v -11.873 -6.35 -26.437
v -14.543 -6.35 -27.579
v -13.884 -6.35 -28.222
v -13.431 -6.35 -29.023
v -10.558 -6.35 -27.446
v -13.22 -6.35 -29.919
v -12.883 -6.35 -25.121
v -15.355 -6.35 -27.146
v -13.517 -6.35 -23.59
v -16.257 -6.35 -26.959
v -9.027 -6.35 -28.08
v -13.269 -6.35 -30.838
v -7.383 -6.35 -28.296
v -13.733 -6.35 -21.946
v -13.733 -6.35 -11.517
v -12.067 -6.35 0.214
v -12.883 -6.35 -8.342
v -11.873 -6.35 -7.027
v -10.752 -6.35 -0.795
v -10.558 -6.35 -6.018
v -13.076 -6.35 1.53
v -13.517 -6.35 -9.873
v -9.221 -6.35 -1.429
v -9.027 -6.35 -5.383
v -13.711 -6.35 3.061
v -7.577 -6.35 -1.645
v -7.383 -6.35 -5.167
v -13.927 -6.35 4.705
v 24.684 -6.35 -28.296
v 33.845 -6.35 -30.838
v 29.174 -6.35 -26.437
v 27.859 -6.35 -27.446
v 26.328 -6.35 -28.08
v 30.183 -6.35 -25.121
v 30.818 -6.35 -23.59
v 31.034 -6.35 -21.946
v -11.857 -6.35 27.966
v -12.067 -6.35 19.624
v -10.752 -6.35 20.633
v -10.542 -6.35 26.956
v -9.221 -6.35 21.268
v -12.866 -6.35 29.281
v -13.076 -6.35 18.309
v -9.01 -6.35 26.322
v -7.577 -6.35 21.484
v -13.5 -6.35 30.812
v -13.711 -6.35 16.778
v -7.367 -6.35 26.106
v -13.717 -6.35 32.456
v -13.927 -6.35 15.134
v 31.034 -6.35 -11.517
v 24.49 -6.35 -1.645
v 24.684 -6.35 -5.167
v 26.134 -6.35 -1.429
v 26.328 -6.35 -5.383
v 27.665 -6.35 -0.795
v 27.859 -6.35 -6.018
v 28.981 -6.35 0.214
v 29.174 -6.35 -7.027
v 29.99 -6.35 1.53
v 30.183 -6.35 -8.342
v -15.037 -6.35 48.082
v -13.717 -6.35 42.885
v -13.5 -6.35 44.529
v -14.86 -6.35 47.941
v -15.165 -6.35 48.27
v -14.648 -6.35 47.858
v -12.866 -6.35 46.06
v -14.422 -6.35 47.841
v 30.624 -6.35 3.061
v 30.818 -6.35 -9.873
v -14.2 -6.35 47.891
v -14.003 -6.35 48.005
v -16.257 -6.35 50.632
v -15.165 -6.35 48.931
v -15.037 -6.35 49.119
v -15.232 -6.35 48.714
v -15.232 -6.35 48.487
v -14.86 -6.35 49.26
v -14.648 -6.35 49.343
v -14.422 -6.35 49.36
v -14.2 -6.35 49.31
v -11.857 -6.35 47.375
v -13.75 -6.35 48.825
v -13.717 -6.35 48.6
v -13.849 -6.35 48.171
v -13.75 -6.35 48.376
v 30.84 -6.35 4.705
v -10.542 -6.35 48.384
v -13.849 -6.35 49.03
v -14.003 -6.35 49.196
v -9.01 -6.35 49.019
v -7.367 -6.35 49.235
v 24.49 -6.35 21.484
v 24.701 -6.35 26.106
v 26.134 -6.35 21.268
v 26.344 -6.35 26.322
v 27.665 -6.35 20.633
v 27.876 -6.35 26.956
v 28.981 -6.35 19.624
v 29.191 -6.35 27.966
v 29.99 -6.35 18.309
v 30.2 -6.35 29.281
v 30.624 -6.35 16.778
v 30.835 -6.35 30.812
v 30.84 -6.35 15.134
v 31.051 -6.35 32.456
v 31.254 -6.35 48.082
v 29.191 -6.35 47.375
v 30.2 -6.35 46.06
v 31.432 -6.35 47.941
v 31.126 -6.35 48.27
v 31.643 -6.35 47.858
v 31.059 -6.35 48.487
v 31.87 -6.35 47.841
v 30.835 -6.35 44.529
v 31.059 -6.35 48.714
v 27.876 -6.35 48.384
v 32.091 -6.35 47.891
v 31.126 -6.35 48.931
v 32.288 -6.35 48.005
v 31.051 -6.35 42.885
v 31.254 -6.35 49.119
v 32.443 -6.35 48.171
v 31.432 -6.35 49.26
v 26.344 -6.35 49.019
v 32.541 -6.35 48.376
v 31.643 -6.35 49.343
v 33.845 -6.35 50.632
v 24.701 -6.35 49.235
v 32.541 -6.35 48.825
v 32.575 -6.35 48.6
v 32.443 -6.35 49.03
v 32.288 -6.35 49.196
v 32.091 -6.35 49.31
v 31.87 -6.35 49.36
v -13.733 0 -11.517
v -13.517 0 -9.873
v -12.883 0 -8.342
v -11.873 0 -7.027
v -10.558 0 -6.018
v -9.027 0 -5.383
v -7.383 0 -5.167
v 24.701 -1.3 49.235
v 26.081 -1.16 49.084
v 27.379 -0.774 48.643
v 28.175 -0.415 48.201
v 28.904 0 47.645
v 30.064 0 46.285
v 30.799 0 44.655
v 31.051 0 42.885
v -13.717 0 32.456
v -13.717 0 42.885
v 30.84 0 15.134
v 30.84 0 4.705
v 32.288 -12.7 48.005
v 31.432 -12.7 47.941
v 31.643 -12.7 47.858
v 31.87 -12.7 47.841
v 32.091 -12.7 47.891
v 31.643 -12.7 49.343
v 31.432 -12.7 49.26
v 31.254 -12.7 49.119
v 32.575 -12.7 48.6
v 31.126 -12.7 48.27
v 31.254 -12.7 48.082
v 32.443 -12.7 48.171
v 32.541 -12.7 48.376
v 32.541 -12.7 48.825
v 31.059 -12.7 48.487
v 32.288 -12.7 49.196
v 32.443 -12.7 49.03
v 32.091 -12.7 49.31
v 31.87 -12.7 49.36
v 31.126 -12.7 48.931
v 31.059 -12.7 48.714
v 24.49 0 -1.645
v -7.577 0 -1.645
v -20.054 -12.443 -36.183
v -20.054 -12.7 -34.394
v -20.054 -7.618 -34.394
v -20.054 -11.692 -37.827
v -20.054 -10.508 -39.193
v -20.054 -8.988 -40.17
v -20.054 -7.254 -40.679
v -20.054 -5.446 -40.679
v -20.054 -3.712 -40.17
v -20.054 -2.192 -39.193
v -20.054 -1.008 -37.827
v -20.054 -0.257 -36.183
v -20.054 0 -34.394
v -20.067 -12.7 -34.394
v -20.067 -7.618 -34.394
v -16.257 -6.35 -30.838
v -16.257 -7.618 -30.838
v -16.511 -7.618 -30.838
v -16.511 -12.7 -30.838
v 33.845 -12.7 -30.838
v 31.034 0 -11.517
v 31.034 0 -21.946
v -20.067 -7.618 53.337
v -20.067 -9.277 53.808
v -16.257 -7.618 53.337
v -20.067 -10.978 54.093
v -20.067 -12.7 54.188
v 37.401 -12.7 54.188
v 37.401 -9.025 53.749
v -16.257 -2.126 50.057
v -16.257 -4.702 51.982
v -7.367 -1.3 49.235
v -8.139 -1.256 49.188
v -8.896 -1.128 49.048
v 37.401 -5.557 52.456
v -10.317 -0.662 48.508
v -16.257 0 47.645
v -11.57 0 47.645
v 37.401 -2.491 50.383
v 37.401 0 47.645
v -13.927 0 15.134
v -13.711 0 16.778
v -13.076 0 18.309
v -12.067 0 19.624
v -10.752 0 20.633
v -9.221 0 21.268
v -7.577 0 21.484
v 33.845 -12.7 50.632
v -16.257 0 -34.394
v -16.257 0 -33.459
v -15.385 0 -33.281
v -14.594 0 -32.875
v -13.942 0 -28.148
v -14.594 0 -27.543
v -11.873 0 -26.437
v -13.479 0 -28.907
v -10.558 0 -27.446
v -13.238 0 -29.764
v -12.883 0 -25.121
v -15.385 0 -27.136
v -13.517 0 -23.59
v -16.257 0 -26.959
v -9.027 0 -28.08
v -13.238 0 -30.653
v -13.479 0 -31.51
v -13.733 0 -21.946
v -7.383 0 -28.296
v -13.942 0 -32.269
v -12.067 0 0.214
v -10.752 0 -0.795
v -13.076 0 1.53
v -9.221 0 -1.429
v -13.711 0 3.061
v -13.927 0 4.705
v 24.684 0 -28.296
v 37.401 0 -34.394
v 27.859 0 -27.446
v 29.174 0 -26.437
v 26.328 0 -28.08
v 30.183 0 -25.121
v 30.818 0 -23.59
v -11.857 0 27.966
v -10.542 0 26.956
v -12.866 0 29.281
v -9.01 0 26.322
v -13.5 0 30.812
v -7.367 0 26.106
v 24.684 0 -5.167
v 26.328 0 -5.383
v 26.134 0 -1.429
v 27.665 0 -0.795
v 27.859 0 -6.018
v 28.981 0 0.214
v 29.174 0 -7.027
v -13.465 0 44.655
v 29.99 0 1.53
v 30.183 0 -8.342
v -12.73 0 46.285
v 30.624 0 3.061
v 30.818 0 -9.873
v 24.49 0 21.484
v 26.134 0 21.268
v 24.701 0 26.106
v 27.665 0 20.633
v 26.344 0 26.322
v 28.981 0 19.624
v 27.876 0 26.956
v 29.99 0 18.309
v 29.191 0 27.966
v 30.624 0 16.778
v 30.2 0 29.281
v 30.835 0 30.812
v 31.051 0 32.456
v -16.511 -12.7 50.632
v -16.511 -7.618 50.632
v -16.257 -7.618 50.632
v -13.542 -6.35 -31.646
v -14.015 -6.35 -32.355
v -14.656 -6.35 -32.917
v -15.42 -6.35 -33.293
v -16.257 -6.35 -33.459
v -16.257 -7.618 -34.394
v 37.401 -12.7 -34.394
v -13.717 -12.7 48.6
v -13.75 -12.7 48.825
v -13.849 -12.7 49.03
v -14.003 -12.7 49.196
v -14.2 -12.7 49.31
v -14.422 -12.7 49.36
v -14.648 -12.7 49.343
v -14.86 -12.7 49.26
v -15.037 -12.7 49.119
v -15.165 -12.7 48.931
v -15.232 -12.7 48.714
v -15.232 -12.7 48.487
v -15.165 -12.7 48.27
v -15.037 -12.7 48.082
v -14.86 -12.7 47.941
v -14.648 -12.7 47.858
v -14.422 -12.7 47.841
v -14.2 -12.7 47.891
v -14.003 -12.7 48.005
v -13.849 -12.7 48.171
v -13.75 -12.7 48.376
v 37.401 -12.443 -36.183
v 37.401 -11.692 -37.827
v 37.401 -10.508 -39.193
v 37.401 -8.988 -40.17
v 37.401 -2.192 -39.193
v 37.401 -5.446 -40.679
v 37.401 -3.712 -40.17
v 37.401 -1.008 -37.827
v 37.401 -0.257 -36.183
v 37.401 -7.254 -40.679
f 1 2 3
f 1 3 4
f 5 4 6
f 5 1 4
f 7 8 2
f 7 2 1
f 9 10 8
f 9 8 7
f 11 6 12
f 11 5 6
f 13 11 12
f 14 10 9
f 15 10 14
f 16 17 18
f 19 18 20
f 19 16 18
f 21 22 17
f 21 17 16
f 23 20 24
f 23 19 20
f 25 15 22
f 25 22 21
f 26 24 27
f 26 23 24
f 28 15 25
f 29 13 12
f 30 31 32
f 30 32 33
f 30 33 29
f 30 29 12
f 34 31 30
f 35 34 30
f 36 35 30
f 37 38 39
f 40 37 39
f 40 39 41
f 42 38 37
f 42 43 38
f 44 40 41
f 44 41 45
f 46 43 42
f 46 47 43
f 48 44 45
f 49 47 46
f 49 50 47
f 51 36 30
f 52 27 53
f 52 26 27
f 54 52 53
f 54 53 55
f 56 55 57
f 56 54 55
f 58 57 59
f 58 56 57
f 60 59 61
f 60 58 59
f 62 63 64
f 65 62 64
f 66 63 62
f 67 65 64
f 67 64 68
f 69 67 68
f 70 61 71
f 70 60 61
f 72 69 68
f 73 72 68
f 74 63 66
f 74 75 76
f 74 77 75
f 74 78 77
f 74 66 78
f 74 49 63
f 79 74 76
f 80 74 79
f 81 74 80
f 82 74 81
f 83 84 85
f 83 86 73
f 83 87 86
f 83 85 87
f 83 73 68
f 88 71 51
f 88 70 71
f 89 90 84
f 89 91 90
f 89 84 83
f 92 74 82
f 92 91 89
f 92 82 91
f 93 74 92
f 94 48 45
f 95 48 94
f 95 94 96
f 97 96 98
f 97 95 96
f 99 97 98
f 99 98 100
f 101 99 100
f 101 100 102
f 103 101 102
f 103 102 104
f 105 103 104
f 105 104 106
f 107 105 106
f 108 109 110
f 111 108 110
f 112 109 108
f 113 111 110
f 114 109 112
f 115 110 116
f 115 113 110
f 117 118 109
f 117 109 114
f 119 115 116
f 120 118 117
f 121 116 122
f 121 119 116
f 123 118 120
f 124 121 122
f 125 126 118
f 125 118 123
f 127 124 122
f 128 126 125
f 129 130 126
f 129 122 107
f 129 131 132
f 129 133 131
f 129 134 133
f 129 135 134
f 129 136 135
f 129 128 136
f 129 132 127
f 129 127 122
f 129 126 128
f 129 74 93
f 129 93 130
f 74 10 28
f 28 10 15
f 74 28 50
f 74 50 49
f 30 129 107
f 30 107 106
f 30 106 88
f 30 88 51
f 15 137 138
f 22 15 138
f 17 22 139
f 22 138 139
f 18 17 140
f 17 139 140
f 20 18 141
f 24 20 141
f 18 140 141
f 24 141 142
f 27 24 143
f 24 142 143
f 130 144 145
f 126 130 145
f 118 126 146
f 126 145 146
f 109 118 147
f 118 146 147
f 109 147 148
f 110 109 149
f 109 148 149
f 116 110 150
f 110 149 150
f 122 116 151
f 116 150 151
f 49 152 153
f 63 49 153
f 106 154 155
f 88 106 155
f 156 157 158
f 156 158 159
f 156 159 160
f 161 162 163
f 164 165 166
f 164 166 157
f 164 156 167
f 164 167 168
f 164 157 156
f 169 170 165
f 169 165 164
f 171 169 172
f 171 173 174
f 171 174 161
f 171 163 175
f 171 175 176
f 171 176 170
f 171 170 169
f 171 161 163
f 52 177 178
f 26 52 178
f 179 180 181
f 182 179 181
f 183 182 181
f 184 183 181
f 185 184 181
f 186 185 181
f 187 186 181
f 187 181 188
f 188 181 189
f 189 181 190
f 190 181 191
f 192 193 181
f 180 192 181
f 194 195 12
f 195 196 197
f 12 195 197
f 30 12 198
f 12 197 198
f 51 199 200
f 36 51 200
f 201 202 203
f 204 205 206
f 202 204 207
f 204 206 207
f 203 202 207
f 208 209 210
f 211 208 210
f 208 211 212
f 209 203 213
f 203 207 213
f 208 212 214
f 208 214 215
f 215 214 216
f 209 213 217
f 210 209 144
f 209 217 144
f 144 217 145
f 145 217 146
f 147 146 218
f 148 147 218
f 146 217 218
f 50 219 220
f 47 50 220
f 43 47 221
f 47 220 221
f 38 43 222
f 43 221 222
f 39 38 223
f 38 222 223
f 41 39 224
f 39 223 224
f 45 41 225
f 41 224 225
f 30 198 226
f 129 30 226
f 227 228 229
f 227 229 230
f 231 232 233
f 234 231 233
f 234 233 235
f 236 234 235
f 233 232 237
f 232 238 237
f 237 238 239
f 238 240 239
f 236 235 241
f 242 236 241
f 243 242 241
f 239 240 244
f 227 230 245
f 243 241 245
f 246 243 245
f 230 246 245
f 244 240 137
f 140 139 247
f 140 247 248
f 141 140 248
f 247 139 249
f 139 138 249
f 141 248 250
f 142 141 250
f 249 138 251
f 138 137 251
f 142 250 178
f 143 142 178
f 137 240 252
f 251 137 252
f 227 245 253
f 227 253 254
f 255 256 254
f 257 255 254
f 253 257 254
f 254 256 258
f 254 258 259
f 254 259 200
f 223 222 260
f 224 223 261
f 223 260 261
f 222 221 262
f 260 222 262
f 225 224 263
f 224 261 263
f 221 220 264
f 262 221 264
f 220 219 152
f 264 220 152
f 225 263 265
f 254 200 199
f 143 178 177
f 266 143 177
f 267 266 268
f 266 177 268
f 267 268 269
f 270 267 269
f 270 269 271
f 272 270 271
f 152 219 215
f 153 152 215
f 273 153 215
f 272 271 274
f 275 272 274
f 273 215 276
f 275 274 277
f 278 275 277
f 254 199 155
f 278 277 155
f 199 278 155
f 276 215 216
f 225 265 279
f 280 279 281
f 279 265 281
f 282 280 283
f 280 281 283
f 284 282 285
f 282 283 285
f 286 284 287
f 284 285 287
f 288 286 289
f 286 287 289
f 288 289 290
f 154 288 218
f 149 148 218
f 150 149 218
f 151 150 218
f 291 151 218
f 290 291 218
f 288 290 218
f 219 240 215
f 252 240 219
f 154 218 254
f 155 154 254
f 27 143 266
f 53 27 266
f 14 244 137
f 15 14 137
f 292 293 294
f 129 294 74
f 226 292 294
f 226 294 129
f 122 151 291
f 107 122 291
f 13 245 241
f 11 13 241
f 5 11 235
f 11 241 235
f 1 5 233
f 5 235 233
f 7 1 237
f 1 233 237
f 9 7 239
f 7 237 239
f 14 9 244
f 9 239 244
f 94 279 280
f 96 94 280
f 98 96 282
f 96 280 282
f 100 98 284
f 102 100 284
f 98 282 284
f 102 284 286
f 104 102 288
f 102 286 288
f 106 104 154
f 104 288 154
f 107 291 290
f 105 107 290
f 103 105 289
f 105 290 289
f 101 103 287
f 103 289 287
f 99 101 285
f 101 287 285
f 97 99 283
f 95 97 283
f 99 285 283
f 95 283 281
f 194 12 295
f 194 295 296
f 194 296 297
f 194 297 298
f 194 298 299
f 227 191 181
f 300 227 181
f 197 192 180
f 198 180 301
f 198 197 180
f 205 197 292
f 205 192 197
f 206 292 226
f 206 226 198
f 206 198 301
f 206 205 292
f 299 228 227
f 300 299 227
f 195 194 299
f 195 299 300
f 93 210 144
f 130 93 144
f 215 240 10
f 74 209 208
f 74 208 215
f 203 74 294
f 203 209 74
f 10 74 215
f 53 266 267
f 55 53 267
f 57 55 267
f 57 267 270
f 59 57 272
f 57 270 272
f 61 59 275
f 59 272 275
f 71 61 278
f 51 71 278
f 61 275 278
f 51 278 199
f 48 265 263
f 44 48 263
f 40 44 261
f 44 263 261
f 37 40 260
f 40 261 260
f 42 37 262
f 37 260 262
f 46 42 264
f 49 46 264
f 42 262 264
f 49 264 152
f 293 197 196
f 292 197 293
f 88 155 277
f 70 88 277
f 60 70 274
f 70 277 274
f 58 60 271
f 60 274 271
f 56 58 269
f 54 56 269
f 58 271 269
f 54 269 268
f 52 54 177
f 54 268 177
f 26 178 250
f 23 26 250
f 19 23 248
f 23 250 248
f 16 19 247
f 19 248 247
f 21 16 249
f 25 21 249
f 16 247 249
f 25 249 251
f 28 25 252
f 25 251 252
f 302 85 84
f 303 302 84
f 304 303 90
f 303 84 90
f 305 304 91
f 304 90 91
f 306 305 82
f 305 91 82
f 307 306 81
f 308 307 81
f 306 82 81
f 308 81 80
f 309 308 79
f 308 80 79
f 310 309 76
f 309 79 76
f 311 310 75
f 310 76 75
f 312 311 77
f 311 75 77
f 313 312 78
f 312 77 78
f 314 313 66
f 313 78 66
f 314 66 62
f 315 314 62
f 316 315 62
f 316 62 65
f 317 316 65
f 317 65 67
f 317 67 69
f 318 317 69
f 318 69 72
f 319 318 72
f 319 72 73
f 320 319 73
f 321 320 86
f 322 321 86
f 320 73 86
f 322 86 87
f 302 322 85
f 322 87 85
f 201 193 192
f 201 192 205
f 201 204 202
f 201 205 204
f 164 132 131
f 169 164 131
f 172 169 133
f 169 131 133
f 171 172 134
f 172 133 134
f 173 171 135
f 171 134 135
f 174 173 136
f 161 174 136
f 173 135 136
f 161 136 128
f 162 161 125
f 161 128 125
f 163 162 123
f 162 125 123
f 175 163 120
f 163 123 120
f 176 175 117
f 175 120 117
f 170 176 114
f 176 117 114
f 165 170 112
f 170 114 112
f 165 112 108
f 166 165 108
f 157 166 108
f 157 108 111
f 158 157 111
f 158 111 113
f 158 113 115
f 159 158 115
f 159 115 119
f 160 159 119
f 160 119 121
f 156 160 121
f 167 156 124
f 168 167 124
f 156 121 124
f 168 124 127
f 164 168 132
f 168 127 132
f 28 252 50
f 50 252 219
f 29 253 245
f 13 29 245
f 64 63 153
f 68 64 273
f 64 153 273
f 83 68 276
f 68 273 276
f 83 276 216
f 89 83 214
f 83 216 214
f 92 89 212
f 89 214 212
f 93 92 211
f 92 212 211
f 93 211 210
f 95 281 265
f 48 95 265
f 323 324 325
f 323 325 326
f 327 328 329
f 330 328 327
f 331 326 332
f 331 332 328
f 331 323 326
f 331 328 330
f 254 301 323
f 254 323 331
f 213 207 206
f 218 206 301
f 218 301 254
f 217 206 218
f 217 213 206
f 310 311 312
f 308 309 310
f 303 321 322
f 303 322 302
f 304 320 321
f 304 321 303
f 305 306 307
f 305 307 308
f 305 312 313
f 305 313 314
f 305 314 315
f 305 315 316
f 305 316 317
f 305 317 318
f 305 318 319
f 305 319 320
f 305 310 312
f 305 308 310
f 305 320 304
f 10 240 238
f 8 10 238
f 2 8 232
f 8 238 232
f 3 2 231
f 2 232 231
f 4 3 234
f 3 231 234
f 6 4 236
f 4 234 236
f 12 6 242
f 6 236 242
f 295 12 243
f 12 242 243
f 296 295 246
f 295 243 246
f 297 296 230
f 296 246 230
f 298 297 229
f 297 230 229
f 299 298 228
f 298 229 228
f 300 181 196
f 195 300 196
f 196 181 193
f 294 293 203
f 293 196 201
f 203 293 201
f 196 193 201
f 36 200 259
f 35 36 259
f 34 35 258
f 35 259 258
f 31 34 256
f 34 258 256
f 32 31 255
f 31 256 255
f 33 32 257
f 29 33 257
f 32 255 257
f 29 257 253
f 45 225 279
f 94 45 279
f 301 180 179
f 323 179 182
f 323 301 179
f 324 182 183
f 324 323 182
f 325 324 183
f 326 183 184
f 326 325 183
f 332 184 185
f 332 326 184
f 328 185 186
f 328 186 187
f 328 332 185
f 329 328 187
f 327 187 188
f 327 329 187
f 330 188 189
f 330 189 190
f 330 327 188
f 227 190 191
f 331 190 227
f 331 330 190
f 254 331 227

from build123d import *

# Parameters (mm, degrees)
F0_W      = 57.4675095904
F0_H      = 88.5825127872
F1_DEPTH  = 12.7
F3_DEPTH  = 57.4685095904
F4_W      = 50.3555086569
F4_H      = 81.4705118537
F5_DEPTH  = 6.35
F6_R      = 0.7619995332
F8_DEPTH  = 6.35
F11_DEPTH = 56.388
F12_DEPTH = 1.0668
F15_DEPTH = 6.35
F16_DEPTH = 3.81


# Not quite as in the source:
# - a feature of the source that left no trace in its solid (it failed there, or was rolled back) is left out


with BuildPart() as f1:
    # F0 (on Front) → F1 (new body)
    with BuildSketch(Plane.XZ):
        with Locations((8.6671997911, 9.8971910775)):
            Rectangle(F0_W, F0_H)
        with BuildLine():
            ThreePointArc((-13.7333380541, -11.5169252571), (-11.8734661146, -7.0267971965), (-7.3833380541, -5.1669252571))
            Line((-7.3833380541, -5.1669252571), (24.6841715364, -5.1669252571))
            ThreePointArc((24.6841715364, -5.1669252571), (29.1742995969, -7.0267971965), (31.0341715364, -11.5169252571))
            Line((31.0341715364, -11.5169252571), (31.0341715364, -21.9464536455))
            ThreePointArc((31.0341715364, -21.9464536455), (29.1742995969, -26.436581706), (24.6841715364, -28.2964536455))
            Line((24.6841715364, -28.2964536455), (-7.3833380541, -28.2964536455))
            ThreePointArc((-7.3833380541, -28.2964536455), (-11.8734661146, -26.436581706), (-13.7333380541, -21.9464536455))
            Line((-13.7333380541, -21.9464536455), (-13.7333380541, -11.5169252571))
        make_face(mode=Mode.SUBTRACT)
        with BuildLine():
            ThreePointArc((-13.9270129099, 15.1340997942), (-12.0671409704, 19.6242278547), (-7.5770129099, 21.4840997942))
            Line((-7.5770129099, 21.4840997942), (24.4904966805, 21.4840997942))
            ThreePointArc((24.4904966805, 21.4840997942), (28.980624741, 19.6242278547), (30.8404966805, 15.1340997942))
            Line((30.8404966805, 15.1340997942), (30.8404966805, 4.7045714058))
            ThreePointArc((30.8404966805, 4.7045714058), (28.980624741, 0.2144433453), (24.4904966805, -1.6454285942))
            Line((24.4904966805, -1.6454285942), (-7.5770129099, -1.6454285942))
            ThreePointArc((-7.5770129099, -1.6454285942), (-12.0671409704, 0.2144433453), (-13.9270129099, 4.7045714058))
            Line((-13.9270129099, 4.7045714058), (-13.9270129099, 15.1340997942))
        make_face(mode=Mode.SUBTRACT)
        with BuildLine():
            ThreePointArc((-13.7165550041, 42.8851837456), (-11.8566830647, 47.3753118062), (-7.3665550041, 49.2351837456))
            Line((-7.3665550041, 49.2351837456), (24.7009545863, 49.2351837456))
            ThreePointArc((24.7009545863, 49.2351837456), (29.1910826468, 47.3753118062), (31.0509545863, 42.8851837456))
            Line((31.0509545863, 42.8851837456), (31.0509545863, 32.4556553572))
            ThreePointArc((31.0509545863, 32.4556553572), (29.1910826468, 27.9655272967), (24.7009545863, 26.1056553572))
            Line((24.7009545863, 26.1056553572), (-7.3665550041, 26.1056553572))
            ThreePointArc((-7.3665550041, 26.1056553572), (-11.8566830647, 27.9655272967), (-13.7165550041, 32.4556553572))
            Line((-13.7165550041, 32.4556553572), (-13.7165550041, 42.8851837456))
        make_face(mode=Mode.SUBTRACT)
    extrude(amount=F1_DEPTH)

    # F2 (on face) → F3 (cut, through all)
    with BuildSketch(Plane.YZ.offset(37.4009545863)):
        with BuildLine():
            ThreePointArc((-12.7, 54.1884474711), (-5.5566722855, 52.456369837), (0, 47.6448610425))
            Line((0, 47.6448610425), (0, 54.1884474711))
            Line((0, 54.1884474711), (-12.7, 54.1884474711))
        make_face()
    extrude(amount=-F3_DEPTH, mode=Mode.SUBTRACT)

    # F4 (on face) → F5 (cut)
    with BuildSketch(Plane.XZ.offset(12.7)):
        with Locations((8.6671997911, 9.8971910775)):
            Rectangle(F4_W, F4_H)
        with BuildLine():
            Line((-13.7333380541, -21.9464536455), (-13.7333380541, -11.5169252571))
            ThreePointArc((-13.7333380541, -11.5169252571), (-11.8734661146, -7.0267971965), (-7.3833380541, -5.1669252571))
            Line((-7.3833380541, -5.1669252571), (24.6841715364, -5.1669252571))
            ThreePointArc((24.6841715364, -5.1669252571), (29.1742995969, -7.0267971965), (31.0341715364, -11.5169252571))
            Line((31.0341715364, -11.5169252571), (31.0341715364, -21.9464536455))
            ThreePointArc((31.0341715364, -21.9464536455), (29.1742995969, -26.436581706), (24.6841715364, -28.2964536455))
            Line((24.6841715364, -28.2964536455), (-7.3833380541, -28.2964536455))
            ThreePointArc((-7.3833380541, -28.2964536455), (-11.8734661146, -26.436581706), (-13.7333380541, -21.9464536455))
        make_face(mode=Mode.SUBTRACT)
        with BuildLine():
            Line((24.4904966805, -1.6454285942), (-7.5770129099, -1.6454285942))
            ThreePointArc((-7.5770129099, -1.6454285942), (-12.0671409704, 0.2144433453), (-13.9270129099, 4.7045714058))
            Line((-13.9270129099, 4.7045714058), (-13.9270129099, 15.1340997942))
            ThreePointArc((-13.9270129099, 15.1340997942), (-12.0671409704, 19.6242278547), (-7.5770129099, 21.4840997942))
            Line((-7.5770129099, 21.4840997942), (24.4904966805, 21.4840997942))
            ThreePointArc((24.4904966805, 21.4840997942), (28.980624741, 19.6242278547), (30.8404966805, 15.1340997942))
            Line((30.8404966805, 15.1340997942), (30.8404966805, 4.7045714058))
            ThreePointArc((30.8404966805, 4.7045714058), (28.980624741, 0.2144433453), (24.4904966805, -1.6454285942))
        make_face(mode=Mode.SUBTRACT)
        with BuildLine():
            ThreePointArc((-7.3665550041, 26.1056553572), (-11.8566830647, 27.9655272967), (-13.7165550041, 32.4556553572))
            Line((-13.7165550041, 32.4556553572), (-13.7165550041, 42.8851837456))
            ThreePointArc((-13.7165550041, 42.8851837456), (-11.8566830647, 47.3753118062), (-7.3665550041, 49.2351837456))
            Line((-7.3665550041, 49.2351837456), (24.7009545863, 49.2351837456))
            ThreePointArc((24.7009545863, 49.2351837456), (29.1910826468, 47.3753118062), (31.0509545863, 42.8851837456))
            Line((31.0509545863, 42.8851837456), (31.0509545863, 32.4556553572))
            ThreePointArc((31.0509545863, 32.4556553572), (29.1910826468, 27.9655272967), (24.7009545863, 26.1056553572))
            Line((24.7009545863, 26.1056553572), (-7.3665550041, 26.1056553572))
        make_face(mode=Mode.SUBTRACT)
    extrude(amount=-F5_DEPTH, mode=Mode.SUBTRACT)

    # F6 (on face) → F8 (join)
    with BuildSketch(Plane.XZ.offset(6.35)):
        with Locations((-14.4785545374, 48.6004470043)):
            Circle(F6_R)
        with Locations((31.8129541195, 48.6004470043)):
            Circle(F6_R)
    extrude(amount=F8_DEPTH)

    # F10 (on face) → F11 (join)
    with BuildSketch(Plane.YZ.offset(37.4009545863)):
        with BuildLine():
            Line((0, -34.3940653161), (-12.7, -34.3940653161))
            ThreePointArc((-12.7, -34.3940653161), (-6.35, -40.7440653161), (0, -34.3940653161))
        make_face()
    extrude(amount=-F11_DEPTH)

    # F12 (add): a face of the model
    f12_faces = [f1.faces().sort_by_distance(p)[0] for p in [
        (-18.9870454137, -6.35, -37.0890890192),
    ]]
    extrude(f12_faces, amount=F12_DEPTH)

    # F14 (on face) → F15 (cut)
    with BuildSketch(Plane(origin=(0, 0, 0), x_dir=(-1, 0, 0), z_dir=(0, 1, 0))):
        with BuildLine():
            Line((16.464073211, -26.9519573744), (16.464073211, -33.4652290945))
            ThreePointArc((16.464073211, -33.4652290945), (18.7668625115, -32.5113825349), (19.720709071, -30.2085932344))
            ThreePointArc((19.720709071, -30.2085932344), (18.7668625115, -27.9058039339), (16.464073211, -26.9519573744))
        make_face()
        with BuildLine():
            ThreePointArc((16.464073211, -26.9519573744), (13.2074373509, -30.2085932344), (16.464073211, -33.4652290945))
            Line((16.464073211, -33.4652290945), (16.464073211, -26.9519573744))
        make_face()
    extrude(amount=-F15_DEPTH, mode=Mode.SUBTRACT)

    # F13 (on face) → F16 (cut)
    with BuildSketch(Plane(origin=(-20.0665550041, 0, 0), x_dir=(0, -1, 0), z_dir=(-1, 0, 0))):
        with BuildLine():
            Line((0, -34.3940653161), (7.6183550991, -34.3940653161))
            Line((7.6183550991, -34.3940653161), (7.6183550991, 53.3373526242))
            ThreePointArc((7.6183550991, 53.3373526242), (3.3646993114, 51.0859593692), (0, 47.6448610425))
            Line((0, 47.6448610425), (0, -34.3940653161))
        make_face()
    extrude(amount=-F16_DEPTH, mode=Mode.SUBTRACT)


solid = f1.part
